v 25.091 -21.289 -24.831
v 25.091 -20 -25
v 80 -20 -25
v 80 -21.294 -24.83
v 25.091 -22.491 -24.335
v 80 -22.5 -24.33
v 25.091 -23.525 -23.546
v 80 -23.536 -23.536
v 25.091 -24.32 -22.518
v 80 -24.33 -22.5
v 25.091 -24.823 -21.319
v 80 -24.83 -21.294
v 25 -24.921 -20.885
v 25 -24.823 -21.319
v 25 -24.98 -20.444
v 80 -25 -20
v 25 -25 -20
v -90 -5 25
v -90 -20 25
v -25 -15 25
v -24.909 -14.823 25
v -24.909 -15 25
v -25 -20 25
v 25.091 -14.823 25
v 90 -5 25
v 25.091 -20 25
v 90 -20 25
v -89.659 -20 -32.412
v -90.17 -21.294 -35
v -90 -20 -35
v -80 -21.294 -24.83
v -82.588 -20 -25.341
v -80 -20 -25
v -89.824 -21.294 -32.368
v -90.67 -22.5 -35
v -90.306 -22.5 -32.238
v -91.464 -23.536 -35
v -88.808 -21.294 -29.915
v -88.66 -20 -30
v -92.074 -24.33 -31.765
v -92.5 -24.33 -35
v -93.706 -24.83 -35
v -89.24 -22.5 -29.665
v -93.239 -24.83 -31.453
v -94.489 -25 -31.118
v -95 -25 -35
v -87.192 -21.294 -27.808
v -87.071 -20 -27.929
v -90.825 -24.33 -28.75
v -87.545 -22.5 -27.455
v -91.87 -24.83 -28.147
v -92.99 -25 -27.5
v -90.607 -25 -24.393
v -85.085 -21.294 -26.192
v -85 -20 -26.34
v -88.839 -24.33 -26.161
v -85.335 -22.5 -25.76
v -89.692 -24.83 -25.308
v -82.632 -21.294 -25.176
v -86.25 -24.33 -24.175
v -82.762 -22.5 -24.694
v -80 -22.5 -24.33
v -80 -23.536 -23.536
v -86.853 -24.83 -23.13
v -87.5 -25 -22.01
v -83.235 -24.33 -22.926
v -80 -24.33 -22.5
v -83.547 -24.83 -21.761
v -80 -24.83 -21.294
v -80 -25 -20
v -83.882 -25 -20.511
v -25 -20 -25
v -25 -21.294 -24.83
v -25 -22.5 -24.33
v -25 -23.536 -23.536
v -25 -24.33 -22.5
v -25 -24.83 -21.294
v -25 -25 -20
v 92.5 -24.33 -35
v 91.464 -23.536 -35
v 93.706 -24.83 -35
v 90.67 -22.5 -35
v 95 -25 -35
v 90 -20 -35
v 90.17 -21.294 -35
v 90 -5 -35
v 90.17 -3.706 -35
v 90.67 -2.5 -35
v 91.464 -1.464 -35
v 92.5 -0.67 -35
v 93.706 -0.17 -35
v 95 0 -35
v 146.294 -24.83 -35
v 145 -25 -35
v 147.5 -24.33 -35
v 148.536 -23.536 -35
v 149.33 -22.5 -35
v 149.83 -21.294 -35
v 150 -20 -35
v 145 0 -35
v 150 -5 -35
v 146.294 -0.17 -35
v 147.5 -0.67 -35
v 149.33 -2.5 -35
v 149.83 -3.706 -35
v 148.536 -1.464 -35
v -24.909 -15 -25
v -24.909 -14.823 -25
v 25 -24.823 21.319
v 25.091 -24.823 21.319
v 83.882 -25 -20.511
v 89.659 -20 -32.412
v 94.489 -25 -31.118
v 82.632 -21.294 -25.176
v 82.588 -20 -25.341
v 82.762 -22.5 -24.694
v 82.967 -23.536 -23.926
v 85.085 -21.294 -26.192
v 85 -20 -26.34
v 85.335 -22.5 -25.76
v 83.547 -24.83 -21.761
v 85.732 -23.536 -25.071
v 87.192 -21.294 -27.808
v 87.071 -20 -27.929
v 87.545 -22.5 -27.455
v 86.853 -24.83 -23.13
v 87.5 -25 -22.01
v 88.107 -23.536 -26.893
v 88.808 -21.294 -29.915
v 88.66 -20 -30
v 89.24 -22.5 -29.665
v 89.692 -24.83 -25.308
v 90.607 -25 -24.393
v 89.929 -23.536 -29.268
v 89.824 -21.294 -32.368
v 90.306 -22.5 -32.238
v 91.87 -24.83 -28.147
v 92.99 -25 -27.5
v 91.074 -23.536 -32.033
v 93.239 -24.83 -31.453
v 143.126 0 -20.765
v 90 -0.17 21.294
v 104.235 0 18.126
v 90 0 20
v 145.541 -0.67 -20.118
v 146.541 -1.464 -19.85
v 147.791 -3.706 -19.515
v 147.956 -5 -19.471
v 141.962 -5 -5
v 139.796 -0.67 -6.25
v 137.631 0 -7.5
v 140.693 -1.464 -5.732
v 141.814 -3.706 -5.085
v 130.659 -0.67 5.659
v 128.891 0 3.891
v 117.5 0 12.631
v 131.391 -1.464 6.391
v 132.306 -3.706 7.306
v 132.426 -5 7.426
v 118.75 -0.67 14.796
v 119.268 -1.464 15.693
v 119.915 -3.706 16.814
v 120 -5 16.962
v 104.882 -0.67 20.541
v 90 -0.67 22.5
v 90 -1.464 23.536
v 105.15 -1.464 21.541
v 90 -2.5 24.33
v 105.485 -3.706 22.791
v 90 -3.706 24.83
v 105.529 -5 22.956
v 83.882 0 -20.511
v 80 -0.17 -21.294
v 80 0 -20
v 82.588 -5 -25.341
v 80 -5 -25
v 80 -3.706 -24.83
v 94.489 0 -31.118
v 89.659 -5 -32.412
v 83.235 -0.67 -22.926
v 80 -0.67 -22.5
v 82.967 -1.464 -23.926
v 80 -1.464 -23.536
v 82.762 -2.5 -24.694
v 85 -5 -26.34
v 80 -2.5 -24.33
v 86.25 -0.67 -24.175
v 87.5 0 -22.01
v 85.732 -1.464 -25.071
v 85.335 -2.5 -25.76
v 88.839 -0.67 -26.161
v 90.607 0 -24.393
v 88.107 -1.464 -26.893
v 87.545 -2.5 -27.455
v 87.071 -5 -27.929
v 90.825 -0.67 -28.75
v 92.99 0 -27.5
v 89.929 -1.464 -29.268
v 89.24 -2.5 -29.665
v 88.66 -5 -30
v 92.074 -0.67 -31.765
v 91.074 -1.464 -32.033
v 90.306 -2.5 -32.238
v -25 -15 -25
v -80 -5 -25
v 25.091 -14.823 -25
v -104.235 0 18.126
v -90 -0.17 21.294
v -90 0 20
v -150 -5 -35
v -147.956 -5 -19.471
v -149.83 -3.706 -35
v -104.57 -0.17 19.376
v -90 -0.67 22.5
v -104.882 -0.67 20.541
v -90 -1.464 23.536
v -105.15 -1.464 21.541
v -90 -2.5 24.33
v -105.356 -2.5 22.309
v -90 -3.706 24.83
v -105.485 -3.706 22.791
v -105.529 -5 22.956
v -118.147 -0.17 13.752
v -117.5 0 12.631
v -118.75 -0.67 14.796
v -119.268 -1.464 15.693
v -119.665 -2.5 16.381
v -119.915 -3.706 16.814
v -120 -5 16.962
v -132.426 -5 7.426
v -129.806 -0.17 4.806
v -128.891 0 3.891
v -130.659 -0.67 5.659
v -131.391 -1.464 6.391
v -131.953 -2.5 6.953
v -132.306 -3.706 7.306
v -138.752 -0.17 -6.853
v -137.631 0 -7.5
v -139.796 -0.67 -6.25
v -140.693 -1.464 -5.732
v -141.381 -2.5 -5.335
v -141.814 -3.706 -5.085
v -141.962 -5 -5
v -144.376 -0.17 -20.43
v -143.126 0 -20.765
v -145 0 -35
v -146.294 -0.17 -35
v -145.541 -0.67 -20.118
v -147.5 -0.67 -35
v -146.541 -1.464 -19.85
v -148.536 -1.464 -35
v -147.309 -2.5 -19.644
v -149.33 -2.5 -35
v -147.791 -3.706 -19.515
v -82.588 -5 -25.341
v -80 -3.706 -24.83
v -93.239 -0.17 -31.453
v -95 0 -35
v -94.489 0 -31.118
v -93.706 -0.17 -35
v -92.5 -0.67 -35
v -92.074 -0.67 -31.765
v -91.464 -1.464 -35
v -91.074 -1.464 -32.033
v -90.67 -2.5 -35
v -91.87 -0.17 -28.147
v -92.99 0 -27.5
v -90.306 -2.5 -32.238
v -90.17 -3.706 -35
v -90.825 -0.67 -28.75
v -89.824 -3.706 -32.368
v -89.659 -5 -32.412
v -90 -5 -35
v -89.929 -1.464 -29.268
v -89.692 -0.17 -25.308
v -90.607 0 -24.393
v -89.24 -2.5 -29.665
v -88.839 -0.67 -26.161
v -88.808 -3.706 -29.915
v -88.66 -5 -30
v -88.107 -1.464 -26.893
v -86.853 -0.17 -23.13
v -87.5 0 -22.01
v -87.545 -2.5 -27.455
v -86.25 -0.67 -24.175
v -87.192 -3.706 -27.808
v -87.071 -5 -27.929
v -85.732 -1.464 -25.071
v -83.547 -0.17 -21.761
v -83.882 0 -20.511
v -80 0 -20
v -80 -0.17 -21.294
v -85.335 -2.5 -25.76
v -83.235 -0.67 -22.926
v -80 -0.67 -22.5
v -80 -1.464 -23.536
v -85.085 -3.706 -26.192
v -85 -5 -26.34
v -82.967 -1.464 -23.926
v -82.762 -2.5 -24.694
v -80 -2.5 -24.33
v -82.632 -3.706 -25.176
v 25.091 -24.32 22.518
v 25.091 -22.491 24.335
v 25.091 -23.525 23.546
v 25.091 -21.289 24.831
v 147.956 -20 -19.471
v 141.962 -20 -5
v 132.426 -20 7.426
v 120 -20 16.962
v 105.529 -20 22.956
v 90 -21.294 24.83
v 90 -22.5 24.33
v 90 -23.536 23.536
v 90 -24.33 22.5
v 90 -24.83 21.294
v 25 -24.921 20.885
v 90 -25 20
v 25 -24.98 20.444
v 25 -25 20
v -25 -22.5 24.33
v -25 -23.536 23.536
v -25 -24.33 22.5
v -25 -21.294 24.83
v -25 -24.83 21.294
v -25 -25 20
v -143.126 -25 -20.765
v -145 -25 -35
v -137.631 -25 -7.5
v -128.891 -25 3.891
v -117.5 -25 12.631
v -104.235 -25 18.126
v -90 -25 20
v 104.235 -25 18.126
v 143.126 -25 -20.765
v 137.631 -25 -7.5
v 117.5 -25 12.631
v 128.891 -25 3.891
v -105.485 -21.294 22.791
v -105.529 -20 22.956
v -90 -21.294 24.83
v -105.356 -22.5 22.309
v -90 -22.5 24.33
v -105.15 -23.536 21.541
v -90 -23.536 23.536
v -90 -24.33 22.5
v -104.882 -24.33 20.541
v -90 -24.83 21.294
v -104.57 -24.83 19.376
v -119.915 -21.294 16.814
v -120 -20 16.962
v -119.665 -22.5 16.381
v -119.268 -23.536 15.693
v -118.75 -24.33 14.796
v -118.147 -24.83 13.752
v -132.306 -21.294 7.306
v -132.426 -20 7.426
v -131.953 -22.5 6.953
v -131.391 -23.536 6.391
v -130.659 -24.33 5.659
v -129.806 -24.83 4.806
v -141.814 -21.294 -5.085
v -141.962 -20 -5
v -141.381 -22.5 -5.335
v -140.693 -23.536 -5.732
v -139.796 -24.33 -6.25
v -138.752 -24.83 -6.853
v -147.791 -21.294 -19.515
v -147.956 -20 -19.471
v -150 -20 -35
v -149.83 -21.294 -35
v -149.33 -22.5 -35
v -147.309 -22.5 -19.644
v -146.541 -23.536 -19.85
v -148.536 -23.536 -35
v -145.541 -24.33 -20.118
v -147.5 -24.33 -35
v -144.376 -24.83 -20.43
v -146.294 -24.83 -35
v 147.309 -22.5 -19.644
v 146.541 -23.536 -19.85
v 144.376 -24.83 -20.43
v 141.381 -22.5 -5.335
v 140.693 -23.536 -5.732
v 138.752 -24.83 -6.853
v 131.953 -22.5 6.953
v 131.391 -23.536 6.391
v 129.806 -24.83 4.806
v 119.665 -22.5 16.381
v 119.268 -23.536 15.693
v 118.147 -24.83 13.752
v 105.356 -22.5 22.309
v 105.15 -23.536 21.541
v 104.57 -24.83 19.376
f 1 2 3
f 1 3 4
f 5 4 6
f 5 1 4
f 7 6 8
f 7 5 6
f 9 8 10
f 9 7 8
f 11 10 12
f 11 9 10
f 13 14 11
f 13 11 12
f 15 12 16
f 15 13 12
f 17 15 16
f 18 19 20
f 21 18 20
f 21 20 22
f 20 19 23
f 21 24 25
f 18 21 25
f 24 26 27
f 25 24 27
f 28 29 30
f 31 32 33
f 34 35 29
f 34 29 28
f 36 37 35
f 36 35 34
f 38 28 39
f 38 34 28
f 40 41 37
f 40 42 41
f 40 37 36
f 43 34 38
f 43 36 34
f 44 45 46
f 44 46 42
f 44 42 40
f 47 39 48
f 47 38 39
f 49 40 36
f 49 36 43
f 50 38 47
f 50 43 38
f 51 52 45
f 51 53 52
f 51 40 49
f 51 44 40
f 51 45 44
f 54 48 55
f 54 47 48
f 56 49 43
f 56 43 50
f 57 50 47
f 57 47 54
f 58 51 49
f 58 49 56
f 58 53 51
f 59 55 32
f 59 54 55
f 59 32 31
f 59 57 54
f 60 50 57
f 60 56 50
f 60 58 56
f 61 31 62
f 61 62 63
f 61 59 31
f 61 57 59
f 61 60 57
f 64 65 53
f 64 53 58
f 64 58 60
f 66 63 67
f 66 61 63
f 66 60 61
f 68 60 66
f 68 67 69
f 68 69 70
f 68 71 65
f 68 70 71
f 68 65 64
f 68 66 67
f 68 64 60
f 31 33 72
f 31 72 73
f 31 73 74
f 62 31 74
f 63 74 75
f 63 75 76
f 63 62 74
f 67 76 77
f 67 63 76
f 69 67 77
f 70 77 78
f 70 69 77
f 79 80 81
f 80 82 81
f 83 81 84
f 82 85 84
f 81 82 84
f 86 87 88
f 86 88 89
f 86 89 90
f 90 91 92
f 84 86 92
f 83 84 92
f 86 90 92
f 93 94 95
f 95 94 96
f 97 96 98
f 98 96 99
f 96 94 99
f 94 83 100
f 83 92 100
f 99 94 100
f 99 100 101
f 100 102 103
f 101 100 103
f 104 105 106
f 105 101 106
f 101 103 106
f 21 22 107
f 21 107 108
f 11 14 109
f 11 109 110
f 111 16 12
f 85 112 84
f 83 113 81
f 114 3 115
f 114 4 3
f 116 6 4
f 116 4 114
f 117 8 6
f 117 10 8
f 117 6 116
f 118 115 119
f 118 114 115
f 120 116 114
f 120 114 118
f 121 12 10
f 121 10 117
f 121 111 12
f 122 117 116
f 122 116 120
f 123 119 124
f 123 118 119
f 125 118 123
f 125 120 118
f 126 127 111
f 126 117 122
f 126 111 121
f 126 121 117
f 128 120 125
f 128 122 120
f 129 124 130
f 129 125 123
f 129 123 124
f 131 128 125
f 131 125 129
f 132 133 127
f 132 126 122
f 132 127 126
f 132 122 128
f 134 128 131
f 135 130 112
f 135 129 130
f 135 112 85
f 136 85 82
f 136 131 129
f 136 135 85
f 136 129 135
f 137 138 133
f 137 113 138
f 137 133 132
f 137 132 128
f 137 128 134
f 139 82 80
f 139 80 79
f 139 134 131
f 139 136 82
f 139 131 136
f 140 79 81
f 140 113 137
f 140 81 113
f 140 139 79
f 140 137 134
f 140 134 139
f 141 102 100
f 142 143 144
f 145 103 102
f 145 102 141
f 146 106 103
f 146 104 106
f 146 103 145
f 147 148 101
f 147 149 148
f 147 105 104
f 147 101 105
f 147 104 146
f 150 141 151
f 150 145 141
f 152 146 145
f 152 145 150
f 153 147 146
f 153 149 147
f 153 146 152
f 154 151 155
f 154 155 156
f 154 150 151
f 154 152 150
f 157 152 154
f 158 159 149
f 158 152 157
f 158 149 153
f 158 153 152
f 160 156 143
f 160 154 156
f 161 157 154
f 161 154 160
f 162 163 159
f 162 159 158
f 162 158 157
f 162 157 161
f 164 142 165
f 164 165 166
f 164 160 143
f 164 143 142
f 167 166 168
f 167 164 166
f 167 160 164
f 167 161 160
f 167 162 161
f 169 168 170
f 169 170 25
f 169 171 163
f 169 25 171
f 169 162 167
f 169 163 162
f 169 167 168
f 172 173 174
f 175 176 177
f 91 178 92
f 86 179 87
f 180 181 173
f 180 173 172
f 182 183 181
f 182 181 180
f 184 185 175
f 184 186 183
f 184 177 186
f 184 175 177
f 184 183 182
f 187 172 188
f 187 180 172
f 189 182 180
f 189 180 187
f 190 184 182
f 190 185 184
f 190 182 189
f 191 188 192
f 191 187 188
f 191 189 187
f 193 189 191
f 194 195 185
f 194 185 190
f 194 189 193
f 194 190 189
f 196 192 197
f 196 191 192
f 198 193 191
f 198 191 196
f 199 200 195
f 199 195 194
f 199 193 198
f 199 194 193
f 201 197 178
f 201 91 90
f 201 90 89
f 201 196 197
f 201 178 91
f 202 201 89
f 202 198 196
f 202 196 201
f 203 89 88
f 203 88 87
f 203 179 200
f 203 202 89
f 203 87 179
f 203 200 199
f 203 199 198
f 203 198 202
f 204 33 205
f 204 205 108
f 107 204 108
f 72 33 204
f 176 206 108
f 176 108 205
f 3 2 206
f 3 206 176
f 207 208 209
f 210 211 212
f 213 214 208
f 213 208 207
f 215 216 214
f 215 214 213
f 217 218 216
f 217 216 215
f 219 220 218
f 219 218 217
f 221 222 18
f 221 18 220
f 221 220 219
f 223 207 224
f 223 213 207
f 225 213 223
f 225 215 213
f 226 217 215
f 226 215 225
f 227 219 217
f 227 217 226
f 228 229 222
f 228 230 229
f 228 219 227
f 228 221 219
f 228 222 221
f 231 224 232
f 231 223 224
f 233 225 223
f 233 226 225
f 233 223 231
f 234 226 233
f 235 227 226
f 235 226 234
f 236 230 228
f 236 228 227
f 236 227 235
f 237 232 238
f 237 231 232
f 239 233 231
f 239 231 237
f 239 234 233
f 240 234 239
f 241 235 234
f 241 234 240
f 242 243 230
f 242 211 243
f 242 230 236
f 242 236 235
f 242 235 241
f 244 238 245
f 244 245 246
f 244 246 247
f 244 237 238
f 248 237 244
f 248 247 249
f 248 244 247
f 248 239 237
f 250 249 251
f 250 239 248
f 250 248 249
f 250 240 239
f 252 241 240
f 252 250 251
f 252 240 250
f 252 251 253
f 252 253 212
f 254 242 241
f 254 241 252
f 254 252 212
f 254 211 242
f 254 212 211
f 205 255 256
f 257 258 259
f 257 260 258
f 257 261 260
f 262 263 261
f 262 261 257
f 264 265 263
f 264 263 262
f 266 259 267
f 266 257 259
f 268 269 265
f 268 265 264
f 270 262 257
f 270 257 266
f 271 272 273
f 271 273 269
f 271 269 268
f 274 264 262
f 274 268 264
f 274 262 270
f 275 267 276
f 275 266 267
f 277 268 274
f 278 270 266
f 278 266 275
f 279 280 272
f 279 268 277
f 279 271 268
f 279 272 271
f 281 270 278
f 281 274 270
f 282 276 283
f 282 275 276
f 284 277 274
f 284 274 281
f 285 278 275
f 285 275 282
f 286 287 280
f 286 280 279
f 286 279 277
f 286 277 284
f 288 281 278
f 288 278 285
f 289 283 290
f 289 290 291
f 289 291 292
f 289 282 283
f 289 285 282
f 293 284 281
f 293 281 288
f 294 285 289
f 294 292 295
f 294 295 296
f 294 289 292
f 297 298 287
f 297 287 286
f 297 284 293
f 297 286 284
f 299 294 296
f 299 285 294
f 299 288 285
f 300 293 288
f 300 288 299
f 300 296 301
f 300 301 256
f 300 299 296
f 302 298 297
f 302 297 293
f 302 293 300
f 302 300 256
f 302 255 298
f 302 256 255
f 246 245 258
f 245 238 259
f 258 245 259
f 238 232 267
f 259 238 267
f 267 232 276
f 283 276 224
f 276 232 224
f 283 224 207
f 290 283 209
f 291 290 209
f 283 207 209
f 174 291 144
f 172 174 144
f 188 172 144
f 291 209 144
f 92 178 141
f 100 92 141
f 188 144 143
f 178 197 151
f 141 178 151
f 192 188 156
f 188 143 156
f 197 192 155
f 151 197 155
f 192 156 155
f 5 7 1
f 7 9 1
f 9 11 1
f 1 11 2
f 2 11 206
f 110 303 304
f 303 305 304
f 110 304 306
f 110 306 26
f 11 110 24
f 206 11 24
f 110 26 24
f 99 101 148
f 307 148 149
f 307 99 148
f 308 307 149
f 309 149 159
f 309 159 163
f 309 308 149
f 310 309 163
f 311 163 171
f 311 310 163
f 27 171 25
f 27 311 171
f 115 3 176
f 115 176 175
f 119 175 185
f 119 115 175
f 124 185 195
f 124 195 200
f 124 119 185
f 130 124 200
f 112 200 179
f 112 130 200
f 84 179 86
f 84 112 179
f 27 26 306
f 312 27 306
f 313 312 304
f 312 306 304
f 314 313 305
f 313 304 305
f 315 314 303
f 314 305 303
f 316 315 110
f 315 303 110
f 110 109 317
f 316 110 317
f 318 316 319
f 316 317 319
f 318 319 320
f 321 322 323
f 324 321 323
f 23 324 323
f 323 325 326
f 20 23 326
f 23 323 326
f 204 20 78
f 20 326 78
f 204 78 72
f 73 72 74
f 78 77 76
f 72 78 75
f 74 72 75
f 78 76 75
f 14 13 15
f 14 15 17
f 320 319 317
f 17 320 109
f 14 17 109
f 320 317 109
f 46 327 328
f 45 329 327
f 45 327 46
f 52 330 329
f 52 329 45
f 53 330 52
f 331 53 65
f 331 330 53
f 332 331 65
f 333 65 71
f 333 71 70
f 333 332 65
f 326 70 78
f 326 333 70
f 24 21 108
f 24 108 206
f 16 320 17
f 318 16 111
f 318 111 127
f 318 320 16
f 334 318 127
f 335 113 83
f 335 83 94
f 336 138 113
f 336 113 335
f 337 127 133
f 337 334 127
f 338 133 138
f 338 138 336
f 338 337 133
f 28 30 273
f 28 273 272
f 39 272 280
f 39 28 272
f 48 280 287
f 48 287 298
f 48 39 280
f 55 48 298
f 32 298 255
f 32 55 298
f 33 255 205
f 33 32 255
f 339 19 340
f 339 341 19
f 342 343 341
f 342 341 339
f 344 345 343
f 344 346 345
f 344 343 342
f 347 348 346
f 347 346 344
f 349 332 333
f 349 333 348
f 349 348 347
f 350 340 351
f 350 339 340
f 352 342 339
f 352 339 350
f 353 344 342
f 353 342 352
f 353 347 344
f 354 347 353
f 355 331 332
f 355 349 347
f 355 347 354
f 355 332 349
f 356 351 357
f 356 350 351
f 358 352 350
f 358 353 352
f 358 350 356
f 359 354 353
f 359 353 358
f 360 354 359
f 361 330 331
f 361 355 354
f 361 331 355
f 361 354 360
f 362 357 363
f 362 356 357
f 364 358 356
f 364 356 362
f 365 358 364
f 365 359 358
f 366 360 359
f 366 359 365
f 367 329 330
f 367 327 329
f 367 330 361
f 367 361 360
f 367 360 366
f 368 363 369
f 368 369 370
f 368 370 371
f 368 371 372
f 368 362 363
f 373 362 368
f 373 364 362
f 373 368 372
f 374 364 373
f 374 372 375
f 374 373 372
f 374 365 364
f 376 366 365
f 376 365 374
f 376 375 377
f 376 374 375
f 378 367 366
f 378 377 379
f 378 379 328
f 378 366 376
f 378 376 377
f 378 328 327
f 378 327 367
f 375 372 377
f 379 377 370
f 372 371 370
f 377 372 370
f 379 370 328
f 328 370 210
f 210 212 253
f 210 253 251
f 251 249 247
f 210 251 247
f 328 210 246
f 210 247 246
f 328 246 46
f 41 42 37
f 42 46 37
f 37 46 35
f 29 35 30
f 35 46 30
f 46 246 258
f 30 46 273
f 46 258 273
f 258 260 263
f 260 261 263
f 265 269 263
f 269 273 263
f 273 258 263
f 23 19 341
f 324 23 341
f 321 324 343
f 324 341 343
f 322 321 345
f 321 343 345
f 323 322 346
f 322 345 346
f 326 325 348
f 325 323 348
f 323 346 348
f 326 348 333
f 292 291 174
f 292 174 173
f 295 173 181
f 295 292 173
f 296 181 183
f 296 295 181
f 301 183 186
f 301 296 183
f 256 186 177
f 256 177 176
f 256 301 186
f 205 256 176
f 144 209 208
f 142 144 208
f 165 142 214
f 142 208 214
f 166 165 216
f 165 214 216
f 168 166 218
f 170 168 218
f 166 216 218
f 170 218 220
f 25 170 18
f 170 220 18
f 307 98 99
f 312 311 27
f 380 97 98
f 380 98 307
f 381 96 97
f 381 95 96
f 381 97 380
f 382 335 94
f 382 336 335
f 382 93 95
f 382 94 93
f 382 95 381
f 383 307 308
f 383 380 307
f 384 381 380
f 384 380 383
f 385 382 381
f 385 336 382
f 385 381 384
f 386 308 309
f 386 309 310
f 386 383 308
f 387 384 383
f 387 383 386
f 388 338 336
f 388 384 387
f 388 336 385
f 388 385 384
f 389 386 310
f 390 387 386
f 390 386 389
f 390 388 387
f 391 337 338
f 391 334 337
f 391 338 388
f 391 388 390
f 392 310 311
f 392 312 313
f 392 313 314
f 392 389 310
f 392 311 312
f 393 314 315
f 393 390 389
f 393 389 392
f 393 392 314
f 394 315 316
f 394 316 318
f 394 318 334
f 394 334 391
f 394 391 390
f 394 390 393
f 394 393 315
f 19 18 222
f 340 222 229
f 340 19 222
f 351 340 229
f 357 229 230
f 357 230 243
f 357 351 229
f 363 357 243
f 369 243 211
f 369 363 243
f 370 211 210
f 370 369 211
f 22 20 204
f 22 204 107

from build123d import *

# Parameters (mm, degrees)
F0_W         = 90
F0_H         = 50
F1_DEPTH     = 25
F2_R         = 59.99999
F3_R         = 9.99999
F4_R         = 9.99999
F5_R         = 59.99999
F6_T1_DEPTH  = 12.50001
F6_T3_DEPTH  = 180.00002
F6_T6_ANGLE  = 90
F6_T8_ANGLE  = 90
F7_T1_DEPTH  = 12.50001
F7_T3_DEPTH  = 180.00002
F7_T6_ANGLE  = 90
F7_T8_ANGLE  = 90
F8_T1_DEPTH  = 160.00002
F8_T3_DEPTH  = 12.50001
F8_T6_ANGLE  = 90
F8_T8_ANGLE  = 90
F8_T10_ANGLE = 90
F8_T12_ANGLE = 90
F9_W         = 50
F9_H         = 5
F9_H_2       = 40
F10_DEPTH    = 10
F13_W        = 50
F13_H        = 10
F14_DEPTH    = 60.001
F16_DEPTH    = 10


# Not quite as in the source:
# - a fillet or chamfer that OpenCascade refuses, or shapes differently, is made with other operations: its cross-section is extruded or revolved along the edge and cut away or added
# - a fillet or chamfer is up to 0.001 mm smaller than in the source, because OpenCascade refuses the exact size


with BuildPart() as f1:
    # F0 (on Front) → F1 (new body)
    with BuildSketch(Plane.XZ):
        with Locations((45, 0)):
            Rectangle(F0_W, F0_H)
        Polygon((150, 25), (90, 25), (90, -25), (90, -35), (150, -35), align=None)
        with Locations((-45, 0)):
            Rectangle(F0_W, F0_H)
        Polygon((-90, -25), (-90, 25), (-150, 25), (-150, -35), (-90, -35), align=None)
    extrude(amount=F1_DEPTH)

    # F2 (radius 60 in the source; OpenCascade refuses exactly that, so slightly less here)
    f2_edges = [f1.edges().sort_by_distance(p)[0] for p in [
        (-150, -12.5, 25),
    ]]
    fillet(f2_edges, radius=F2_R)

    # F3 (radius 10 in the source; OpenCascade refuses exactly that, so slightly less here)
    f3_edges = [f1.edges().sort_by_distance(p)[0] for p in [
        (-90, -12.5, -25),
    ]]
    fillet(f3_edges, radius=F3_R)

    # F4 (radius 10 in the source; OpenCascade refuses exactly that, so slightly less here)
    f4_edges = [f1.edges().sort_by_distance(p)[0] for p in [
        (90, -12.5, -25),
    ]]
    fillet(f4_edges, radius=F4_R)

    # F5 (radius 60 in the source; OpenCascade refuses exactly that, so slightly less here)
    f5_edges = [f1.edges().sort_by_distance(p)[0] for p in [
        (150, -12.5, 25),
    ]]
    fillet(f5_edges, radius=F5_R)

    # F6: fillet of radius 5 on 1 edges, made by hand

    # F6_s2 → F6_t1 (cut)
    with BuildSketch(Plane.XY.offset(-47.5)):
        with BuildLine():
            ThreePointArc((150, -20), (148.5355339059, -23.5355339059), (145, -25))
            Line((145, -25), (150, -25))
            Line((150, -25), (150, -20))
        make_face()
        with BuildLine():
            ThreePointArc((-150, -20), (-148.5355339059, -23.5355339059), (-145, -25))
            Line((-145, -25), (-150, -25))
            Line((-150, -25), (-150, -20))
        make_face()
    extrude(amount=F6_T1_DEPTH, mode=Mode.SUBTRACT)

    # F6_s4 → F6_t3 (cut)
    with BuildSketch(Plane.YZ.offset(-90.00001)):
        with BuildLine():
            ThreePointArc((-20, 25), (-23.5355339059, 23.5355339059), (-25, 20))
            Line((-25, 20), (-25, 25))
            Line((-25, 25), (-20, 25))
        make_face()
    extrude(amount=F6_T3_DEPTH, mode=Mode.SUBTRACT)

    # F6_s5 → F6_t6 (revolve, cut)
    with BuildSketch(Plane.XY.offset(-34.99999)):
        with BuildLine():
            ThreePointArc((150, -20), (148.5355339059, -23.5355339059), (145, -25))
            Line((145, -25), (150, -25))
            Line((150, -25), (150, -20))
        make_face()
    revolve(axis=Axis((90.00001, -25, -34.99999), (0, -1, 0)), revolution_arc=F6_T6_ANGLE, mode=Mode.SUBTRACT)

    # F6_s7 → F6_t8 (revolve, cut)
    with BuildSketch(Plane.YZ.offset(-90.00001)):
        with BuildLine():
            ThreePointArc((-20, 25), (-23.5355339059, 23.5355339059), (-25, 20))
            Line((-25, 20), (-25, 25))
            Line((-25, 25), (-20, 25))
        make_face()
    revolve(axis=Axis((-90.00001, -25, -34.99999), (0, -1, 0)), revolution_arc=F6_T8_ANGLE, mode=Mode.SUBTRACT)

    # F7: fillet of radius 5 on 1 edges, made by hand

    # F7_s2 → F7_t1 (cut)
    with BuildSketch(Plane.XY.offset(-47.5)):
        with BuildLine():
            ThreePointArc((145, 0), (148.5355339059, -1.4644660941), (150, -5))
            Line((150, -5), (150, 0))
            Line((150, 0), (145, 0))
        make_face()
        with BuildLine():
            ThreePointArc((-145, 0), (-148.5355339059, -1.4644660941), (-150, -5))
            Line((-150, -5), (-150, 0))
            Line((-150, 0), (-145, 0))
        make_face()
    extrude(amount=F7_T1_DEPTH, mode=Mode.SUBTRACT)

    # F7_s4 → F7_t3 (cut)
    with BuildSketch(Plane.YZ.offset(-90.00001)):
        with BuildLine():
            ThreePointArc((0, 20), (-1.4644660941, 23.5355339059), (-5, 25))
            Line((-5, 25), (0, 25))
            Line((0, 25), (0, 20))
        make_face()
    extrude(amount=F7_T3_DEPTH, mode=Mode.SUBTRACT)

    # F7_s5 → F7_t6 (revolve, cut)
    with BuildSketch(Plane.XY.offset(-34.99999)):
        with BuildLine():
            ThreePointArc((145, 0), (148.5355339059, -1.4644660941), (150, -5))
            Line((150, -5), (150, 0))
            Line((150, 0), (145, 0))
        make_face()
    revolve(axis=Axis((90.00001, 0, -34.99999), (0, -1, 0)), revolution_arc=F7_T6_ANGLE, mode=Mode.SUBTRACT)

    # F7_s7 → F7_t8 (revolve, cut)
    with BuildSketch(Plane.YZ.offset(-90.00001)):
        with BuildLine():
            ThreePointArc((0, 20), (-1.4644660941, 23.5355339059), (-5, 25))
            Line((-5, 25), (0, 25))
            Line((0, 25), (0, 20))
        make_face()
    revolve(axis=Axis((-90.00001, 0, -34.99999), (0, -1, 0)), revolution_arc=F7_T8_ANGLE, mode=Mode.SUBTRACT)

    # F8: fillet of radius 5 on 2 edges, made by hand

    # F8_s2 → F8_t1 (cut)
    with BuildSketch(Plane.YZ.offset(-80.00001)):
        with BuildLine():
            ThreePointArc((-20, -25), (-23.5355339059, -23.5355339059), (-25, -20))
            Line((-25, -20), (-25, -25))
            Line((-25, -25), (-20, -25))
        make_face()
        with BuildLine():
            ThreePointArc((0, -20), (-1.4644660941, -23.5355339059), (-5, -25))
            Line((-5, -25), (0, -25))
            Line((0, -25), (0, -20))
        make_face()
    extrude(amount=F8_T1_DEPTH, mode=Mode.SUBTRACT)

    # F8_s4 → F8_t3 (cut)
    with BuildSketch(Plane.XY.offset(-47.5)):
        with BuildLine():
            ThreePointArc((90, -20), (91.4644660941, -23.5355339059), (95, -25))
            Line((95, -25), (90, -25))
            Line((90, -25), (90, -20))
        make_face()
        with BuildLine():
            ThreePointArc((-90, -20), (-91.4644660941, -23.5355339059), (-95, -25))
            Line((-95, -25), (-90, -25))
            Line((-90, -25), (-90, -20))
        make_face()
        with BuildLine():
            ThreePointArc((95, 0), (91.4644660941, -1.4644660941), (90, -5))
            Line((90, -5), (90, 0))
            Line((90, 0), (95, 0))
        make_face()
        with BuildLine():
            ThreePointArc((-95, 0), (-91.4644660941, -1.4644660941), (-90, -5))
            Line((-90, -5), (-90, 0))
            Line((-90, 0), (-95, 0))
        make_face()
    extrude(amount=F8_T3_DEPTH, mode=Mode.SUBTRACT)

    # F8_s5 → F8_t6 (revolve, cut)
    with BuildSketch(Plane.YZ.offset(80.00001)):
        with BuildLine():
            ThreePointArc((0, -20), (-1.4644660941, -23.5355339059), (-5, -25))
            Line((-5, -25), (0, -25))
            Line((0, -25), (0, -20))
        make_face()
    revolve(axis=Axis((80.00001, 0, -34.99999), (0, 1, 0)), revolution_arc=F8_T6_ANGLE, mode=Mode.SUBTRACT)

    # F8_s7 → F8_t8 (revolve, cut)
    with BuildSketch(Plane.XY.offset(-34.99999)):
        with BuildLine():
            ThreePointArc((-90, -20), (-91.4644660941, -23.5355339059), (-95, -25))
            Line((-95, -25), (-90, -25))
            Line((-90, -25), (-90, -20))
        make_face()
    revolve(axis=Axis((-80.00001, -25, -34.99999), (0, 1, 0)), revolution_arc=F8_T8_ANGLE, mode=Mode.SUBTRACT)

    # F8_s9 → F8_t10 (revolve, cut)
    with BuildSketch(Plane.YZ.offset(80.00001)):
        with BuildLine():
            ThreePointArc((-20, -25), (-23.5355339059, -23.5355339059), (-25, -20))
            Line((-25, -20), (-25, -25))
            Line((-25, -25), (-20, -25))
        make_face()
    revolve(axis=Axis((80.00001, -25, -34.99999), (0, 1, 0)), revolution_arc=F8_T10_ANGLE, mode=Mode.SUBTRACT)

    # F8_s11 → F8_t12 (revolve, cut)
    with BuildSketch(Plane.XY.offset(-34.99999)):
        with BuildLine():
            ThreePointArc((-95, 0), (-91.4644660941, -1.4644660941), (-90, -5))
            Line((-90, -5), (-90, 0))
            Line((-90, 0), (-95, 0))
        make_face()
    revolve(axis=Axis((-80.00001, 0, -34.99999), (0, 1, 0)), revolution_arc=F8_T12_ANGLE, mode=Mode.SUBTRACT)

    # F9 (on face) → F10 (join)
    with BuildSketch(Plane.XZ.offset(25)):
        with Locations((0, -22.5)):
            Rectangle(F9_W, F9_H)
        with Locations((0, 22.5)):
            Rectangle(F9_W, F9_H)
        Rectangle(F9_W, F9_H_2)
    extrude(amount=-F10_DEPTH)

    # F13 (on face) → F14 (cut, through all)
    with BuildSketch(Plane.XY.offset(25)):
        with Locations((0.0907536596, -19.8229007973)):
            Rectangle(F13_W, F13_H)
    extrude(amount=-F14_DEPTH, mode=Mode.SUBTRACT)

    # F15 (on face) → F16 (cut)
    with BuildSketch(Plane.XZ.offset(25)):
        Polygon((25, 25), (-25, 25), (-25, 20), (-25, -20), (-25, -25), (25, -25), (25, -20), (25, 20), align=None)
    extrude(amount=-F16_DEPTH, mode=Mode.SUBTRACT)


solid = f1.part
